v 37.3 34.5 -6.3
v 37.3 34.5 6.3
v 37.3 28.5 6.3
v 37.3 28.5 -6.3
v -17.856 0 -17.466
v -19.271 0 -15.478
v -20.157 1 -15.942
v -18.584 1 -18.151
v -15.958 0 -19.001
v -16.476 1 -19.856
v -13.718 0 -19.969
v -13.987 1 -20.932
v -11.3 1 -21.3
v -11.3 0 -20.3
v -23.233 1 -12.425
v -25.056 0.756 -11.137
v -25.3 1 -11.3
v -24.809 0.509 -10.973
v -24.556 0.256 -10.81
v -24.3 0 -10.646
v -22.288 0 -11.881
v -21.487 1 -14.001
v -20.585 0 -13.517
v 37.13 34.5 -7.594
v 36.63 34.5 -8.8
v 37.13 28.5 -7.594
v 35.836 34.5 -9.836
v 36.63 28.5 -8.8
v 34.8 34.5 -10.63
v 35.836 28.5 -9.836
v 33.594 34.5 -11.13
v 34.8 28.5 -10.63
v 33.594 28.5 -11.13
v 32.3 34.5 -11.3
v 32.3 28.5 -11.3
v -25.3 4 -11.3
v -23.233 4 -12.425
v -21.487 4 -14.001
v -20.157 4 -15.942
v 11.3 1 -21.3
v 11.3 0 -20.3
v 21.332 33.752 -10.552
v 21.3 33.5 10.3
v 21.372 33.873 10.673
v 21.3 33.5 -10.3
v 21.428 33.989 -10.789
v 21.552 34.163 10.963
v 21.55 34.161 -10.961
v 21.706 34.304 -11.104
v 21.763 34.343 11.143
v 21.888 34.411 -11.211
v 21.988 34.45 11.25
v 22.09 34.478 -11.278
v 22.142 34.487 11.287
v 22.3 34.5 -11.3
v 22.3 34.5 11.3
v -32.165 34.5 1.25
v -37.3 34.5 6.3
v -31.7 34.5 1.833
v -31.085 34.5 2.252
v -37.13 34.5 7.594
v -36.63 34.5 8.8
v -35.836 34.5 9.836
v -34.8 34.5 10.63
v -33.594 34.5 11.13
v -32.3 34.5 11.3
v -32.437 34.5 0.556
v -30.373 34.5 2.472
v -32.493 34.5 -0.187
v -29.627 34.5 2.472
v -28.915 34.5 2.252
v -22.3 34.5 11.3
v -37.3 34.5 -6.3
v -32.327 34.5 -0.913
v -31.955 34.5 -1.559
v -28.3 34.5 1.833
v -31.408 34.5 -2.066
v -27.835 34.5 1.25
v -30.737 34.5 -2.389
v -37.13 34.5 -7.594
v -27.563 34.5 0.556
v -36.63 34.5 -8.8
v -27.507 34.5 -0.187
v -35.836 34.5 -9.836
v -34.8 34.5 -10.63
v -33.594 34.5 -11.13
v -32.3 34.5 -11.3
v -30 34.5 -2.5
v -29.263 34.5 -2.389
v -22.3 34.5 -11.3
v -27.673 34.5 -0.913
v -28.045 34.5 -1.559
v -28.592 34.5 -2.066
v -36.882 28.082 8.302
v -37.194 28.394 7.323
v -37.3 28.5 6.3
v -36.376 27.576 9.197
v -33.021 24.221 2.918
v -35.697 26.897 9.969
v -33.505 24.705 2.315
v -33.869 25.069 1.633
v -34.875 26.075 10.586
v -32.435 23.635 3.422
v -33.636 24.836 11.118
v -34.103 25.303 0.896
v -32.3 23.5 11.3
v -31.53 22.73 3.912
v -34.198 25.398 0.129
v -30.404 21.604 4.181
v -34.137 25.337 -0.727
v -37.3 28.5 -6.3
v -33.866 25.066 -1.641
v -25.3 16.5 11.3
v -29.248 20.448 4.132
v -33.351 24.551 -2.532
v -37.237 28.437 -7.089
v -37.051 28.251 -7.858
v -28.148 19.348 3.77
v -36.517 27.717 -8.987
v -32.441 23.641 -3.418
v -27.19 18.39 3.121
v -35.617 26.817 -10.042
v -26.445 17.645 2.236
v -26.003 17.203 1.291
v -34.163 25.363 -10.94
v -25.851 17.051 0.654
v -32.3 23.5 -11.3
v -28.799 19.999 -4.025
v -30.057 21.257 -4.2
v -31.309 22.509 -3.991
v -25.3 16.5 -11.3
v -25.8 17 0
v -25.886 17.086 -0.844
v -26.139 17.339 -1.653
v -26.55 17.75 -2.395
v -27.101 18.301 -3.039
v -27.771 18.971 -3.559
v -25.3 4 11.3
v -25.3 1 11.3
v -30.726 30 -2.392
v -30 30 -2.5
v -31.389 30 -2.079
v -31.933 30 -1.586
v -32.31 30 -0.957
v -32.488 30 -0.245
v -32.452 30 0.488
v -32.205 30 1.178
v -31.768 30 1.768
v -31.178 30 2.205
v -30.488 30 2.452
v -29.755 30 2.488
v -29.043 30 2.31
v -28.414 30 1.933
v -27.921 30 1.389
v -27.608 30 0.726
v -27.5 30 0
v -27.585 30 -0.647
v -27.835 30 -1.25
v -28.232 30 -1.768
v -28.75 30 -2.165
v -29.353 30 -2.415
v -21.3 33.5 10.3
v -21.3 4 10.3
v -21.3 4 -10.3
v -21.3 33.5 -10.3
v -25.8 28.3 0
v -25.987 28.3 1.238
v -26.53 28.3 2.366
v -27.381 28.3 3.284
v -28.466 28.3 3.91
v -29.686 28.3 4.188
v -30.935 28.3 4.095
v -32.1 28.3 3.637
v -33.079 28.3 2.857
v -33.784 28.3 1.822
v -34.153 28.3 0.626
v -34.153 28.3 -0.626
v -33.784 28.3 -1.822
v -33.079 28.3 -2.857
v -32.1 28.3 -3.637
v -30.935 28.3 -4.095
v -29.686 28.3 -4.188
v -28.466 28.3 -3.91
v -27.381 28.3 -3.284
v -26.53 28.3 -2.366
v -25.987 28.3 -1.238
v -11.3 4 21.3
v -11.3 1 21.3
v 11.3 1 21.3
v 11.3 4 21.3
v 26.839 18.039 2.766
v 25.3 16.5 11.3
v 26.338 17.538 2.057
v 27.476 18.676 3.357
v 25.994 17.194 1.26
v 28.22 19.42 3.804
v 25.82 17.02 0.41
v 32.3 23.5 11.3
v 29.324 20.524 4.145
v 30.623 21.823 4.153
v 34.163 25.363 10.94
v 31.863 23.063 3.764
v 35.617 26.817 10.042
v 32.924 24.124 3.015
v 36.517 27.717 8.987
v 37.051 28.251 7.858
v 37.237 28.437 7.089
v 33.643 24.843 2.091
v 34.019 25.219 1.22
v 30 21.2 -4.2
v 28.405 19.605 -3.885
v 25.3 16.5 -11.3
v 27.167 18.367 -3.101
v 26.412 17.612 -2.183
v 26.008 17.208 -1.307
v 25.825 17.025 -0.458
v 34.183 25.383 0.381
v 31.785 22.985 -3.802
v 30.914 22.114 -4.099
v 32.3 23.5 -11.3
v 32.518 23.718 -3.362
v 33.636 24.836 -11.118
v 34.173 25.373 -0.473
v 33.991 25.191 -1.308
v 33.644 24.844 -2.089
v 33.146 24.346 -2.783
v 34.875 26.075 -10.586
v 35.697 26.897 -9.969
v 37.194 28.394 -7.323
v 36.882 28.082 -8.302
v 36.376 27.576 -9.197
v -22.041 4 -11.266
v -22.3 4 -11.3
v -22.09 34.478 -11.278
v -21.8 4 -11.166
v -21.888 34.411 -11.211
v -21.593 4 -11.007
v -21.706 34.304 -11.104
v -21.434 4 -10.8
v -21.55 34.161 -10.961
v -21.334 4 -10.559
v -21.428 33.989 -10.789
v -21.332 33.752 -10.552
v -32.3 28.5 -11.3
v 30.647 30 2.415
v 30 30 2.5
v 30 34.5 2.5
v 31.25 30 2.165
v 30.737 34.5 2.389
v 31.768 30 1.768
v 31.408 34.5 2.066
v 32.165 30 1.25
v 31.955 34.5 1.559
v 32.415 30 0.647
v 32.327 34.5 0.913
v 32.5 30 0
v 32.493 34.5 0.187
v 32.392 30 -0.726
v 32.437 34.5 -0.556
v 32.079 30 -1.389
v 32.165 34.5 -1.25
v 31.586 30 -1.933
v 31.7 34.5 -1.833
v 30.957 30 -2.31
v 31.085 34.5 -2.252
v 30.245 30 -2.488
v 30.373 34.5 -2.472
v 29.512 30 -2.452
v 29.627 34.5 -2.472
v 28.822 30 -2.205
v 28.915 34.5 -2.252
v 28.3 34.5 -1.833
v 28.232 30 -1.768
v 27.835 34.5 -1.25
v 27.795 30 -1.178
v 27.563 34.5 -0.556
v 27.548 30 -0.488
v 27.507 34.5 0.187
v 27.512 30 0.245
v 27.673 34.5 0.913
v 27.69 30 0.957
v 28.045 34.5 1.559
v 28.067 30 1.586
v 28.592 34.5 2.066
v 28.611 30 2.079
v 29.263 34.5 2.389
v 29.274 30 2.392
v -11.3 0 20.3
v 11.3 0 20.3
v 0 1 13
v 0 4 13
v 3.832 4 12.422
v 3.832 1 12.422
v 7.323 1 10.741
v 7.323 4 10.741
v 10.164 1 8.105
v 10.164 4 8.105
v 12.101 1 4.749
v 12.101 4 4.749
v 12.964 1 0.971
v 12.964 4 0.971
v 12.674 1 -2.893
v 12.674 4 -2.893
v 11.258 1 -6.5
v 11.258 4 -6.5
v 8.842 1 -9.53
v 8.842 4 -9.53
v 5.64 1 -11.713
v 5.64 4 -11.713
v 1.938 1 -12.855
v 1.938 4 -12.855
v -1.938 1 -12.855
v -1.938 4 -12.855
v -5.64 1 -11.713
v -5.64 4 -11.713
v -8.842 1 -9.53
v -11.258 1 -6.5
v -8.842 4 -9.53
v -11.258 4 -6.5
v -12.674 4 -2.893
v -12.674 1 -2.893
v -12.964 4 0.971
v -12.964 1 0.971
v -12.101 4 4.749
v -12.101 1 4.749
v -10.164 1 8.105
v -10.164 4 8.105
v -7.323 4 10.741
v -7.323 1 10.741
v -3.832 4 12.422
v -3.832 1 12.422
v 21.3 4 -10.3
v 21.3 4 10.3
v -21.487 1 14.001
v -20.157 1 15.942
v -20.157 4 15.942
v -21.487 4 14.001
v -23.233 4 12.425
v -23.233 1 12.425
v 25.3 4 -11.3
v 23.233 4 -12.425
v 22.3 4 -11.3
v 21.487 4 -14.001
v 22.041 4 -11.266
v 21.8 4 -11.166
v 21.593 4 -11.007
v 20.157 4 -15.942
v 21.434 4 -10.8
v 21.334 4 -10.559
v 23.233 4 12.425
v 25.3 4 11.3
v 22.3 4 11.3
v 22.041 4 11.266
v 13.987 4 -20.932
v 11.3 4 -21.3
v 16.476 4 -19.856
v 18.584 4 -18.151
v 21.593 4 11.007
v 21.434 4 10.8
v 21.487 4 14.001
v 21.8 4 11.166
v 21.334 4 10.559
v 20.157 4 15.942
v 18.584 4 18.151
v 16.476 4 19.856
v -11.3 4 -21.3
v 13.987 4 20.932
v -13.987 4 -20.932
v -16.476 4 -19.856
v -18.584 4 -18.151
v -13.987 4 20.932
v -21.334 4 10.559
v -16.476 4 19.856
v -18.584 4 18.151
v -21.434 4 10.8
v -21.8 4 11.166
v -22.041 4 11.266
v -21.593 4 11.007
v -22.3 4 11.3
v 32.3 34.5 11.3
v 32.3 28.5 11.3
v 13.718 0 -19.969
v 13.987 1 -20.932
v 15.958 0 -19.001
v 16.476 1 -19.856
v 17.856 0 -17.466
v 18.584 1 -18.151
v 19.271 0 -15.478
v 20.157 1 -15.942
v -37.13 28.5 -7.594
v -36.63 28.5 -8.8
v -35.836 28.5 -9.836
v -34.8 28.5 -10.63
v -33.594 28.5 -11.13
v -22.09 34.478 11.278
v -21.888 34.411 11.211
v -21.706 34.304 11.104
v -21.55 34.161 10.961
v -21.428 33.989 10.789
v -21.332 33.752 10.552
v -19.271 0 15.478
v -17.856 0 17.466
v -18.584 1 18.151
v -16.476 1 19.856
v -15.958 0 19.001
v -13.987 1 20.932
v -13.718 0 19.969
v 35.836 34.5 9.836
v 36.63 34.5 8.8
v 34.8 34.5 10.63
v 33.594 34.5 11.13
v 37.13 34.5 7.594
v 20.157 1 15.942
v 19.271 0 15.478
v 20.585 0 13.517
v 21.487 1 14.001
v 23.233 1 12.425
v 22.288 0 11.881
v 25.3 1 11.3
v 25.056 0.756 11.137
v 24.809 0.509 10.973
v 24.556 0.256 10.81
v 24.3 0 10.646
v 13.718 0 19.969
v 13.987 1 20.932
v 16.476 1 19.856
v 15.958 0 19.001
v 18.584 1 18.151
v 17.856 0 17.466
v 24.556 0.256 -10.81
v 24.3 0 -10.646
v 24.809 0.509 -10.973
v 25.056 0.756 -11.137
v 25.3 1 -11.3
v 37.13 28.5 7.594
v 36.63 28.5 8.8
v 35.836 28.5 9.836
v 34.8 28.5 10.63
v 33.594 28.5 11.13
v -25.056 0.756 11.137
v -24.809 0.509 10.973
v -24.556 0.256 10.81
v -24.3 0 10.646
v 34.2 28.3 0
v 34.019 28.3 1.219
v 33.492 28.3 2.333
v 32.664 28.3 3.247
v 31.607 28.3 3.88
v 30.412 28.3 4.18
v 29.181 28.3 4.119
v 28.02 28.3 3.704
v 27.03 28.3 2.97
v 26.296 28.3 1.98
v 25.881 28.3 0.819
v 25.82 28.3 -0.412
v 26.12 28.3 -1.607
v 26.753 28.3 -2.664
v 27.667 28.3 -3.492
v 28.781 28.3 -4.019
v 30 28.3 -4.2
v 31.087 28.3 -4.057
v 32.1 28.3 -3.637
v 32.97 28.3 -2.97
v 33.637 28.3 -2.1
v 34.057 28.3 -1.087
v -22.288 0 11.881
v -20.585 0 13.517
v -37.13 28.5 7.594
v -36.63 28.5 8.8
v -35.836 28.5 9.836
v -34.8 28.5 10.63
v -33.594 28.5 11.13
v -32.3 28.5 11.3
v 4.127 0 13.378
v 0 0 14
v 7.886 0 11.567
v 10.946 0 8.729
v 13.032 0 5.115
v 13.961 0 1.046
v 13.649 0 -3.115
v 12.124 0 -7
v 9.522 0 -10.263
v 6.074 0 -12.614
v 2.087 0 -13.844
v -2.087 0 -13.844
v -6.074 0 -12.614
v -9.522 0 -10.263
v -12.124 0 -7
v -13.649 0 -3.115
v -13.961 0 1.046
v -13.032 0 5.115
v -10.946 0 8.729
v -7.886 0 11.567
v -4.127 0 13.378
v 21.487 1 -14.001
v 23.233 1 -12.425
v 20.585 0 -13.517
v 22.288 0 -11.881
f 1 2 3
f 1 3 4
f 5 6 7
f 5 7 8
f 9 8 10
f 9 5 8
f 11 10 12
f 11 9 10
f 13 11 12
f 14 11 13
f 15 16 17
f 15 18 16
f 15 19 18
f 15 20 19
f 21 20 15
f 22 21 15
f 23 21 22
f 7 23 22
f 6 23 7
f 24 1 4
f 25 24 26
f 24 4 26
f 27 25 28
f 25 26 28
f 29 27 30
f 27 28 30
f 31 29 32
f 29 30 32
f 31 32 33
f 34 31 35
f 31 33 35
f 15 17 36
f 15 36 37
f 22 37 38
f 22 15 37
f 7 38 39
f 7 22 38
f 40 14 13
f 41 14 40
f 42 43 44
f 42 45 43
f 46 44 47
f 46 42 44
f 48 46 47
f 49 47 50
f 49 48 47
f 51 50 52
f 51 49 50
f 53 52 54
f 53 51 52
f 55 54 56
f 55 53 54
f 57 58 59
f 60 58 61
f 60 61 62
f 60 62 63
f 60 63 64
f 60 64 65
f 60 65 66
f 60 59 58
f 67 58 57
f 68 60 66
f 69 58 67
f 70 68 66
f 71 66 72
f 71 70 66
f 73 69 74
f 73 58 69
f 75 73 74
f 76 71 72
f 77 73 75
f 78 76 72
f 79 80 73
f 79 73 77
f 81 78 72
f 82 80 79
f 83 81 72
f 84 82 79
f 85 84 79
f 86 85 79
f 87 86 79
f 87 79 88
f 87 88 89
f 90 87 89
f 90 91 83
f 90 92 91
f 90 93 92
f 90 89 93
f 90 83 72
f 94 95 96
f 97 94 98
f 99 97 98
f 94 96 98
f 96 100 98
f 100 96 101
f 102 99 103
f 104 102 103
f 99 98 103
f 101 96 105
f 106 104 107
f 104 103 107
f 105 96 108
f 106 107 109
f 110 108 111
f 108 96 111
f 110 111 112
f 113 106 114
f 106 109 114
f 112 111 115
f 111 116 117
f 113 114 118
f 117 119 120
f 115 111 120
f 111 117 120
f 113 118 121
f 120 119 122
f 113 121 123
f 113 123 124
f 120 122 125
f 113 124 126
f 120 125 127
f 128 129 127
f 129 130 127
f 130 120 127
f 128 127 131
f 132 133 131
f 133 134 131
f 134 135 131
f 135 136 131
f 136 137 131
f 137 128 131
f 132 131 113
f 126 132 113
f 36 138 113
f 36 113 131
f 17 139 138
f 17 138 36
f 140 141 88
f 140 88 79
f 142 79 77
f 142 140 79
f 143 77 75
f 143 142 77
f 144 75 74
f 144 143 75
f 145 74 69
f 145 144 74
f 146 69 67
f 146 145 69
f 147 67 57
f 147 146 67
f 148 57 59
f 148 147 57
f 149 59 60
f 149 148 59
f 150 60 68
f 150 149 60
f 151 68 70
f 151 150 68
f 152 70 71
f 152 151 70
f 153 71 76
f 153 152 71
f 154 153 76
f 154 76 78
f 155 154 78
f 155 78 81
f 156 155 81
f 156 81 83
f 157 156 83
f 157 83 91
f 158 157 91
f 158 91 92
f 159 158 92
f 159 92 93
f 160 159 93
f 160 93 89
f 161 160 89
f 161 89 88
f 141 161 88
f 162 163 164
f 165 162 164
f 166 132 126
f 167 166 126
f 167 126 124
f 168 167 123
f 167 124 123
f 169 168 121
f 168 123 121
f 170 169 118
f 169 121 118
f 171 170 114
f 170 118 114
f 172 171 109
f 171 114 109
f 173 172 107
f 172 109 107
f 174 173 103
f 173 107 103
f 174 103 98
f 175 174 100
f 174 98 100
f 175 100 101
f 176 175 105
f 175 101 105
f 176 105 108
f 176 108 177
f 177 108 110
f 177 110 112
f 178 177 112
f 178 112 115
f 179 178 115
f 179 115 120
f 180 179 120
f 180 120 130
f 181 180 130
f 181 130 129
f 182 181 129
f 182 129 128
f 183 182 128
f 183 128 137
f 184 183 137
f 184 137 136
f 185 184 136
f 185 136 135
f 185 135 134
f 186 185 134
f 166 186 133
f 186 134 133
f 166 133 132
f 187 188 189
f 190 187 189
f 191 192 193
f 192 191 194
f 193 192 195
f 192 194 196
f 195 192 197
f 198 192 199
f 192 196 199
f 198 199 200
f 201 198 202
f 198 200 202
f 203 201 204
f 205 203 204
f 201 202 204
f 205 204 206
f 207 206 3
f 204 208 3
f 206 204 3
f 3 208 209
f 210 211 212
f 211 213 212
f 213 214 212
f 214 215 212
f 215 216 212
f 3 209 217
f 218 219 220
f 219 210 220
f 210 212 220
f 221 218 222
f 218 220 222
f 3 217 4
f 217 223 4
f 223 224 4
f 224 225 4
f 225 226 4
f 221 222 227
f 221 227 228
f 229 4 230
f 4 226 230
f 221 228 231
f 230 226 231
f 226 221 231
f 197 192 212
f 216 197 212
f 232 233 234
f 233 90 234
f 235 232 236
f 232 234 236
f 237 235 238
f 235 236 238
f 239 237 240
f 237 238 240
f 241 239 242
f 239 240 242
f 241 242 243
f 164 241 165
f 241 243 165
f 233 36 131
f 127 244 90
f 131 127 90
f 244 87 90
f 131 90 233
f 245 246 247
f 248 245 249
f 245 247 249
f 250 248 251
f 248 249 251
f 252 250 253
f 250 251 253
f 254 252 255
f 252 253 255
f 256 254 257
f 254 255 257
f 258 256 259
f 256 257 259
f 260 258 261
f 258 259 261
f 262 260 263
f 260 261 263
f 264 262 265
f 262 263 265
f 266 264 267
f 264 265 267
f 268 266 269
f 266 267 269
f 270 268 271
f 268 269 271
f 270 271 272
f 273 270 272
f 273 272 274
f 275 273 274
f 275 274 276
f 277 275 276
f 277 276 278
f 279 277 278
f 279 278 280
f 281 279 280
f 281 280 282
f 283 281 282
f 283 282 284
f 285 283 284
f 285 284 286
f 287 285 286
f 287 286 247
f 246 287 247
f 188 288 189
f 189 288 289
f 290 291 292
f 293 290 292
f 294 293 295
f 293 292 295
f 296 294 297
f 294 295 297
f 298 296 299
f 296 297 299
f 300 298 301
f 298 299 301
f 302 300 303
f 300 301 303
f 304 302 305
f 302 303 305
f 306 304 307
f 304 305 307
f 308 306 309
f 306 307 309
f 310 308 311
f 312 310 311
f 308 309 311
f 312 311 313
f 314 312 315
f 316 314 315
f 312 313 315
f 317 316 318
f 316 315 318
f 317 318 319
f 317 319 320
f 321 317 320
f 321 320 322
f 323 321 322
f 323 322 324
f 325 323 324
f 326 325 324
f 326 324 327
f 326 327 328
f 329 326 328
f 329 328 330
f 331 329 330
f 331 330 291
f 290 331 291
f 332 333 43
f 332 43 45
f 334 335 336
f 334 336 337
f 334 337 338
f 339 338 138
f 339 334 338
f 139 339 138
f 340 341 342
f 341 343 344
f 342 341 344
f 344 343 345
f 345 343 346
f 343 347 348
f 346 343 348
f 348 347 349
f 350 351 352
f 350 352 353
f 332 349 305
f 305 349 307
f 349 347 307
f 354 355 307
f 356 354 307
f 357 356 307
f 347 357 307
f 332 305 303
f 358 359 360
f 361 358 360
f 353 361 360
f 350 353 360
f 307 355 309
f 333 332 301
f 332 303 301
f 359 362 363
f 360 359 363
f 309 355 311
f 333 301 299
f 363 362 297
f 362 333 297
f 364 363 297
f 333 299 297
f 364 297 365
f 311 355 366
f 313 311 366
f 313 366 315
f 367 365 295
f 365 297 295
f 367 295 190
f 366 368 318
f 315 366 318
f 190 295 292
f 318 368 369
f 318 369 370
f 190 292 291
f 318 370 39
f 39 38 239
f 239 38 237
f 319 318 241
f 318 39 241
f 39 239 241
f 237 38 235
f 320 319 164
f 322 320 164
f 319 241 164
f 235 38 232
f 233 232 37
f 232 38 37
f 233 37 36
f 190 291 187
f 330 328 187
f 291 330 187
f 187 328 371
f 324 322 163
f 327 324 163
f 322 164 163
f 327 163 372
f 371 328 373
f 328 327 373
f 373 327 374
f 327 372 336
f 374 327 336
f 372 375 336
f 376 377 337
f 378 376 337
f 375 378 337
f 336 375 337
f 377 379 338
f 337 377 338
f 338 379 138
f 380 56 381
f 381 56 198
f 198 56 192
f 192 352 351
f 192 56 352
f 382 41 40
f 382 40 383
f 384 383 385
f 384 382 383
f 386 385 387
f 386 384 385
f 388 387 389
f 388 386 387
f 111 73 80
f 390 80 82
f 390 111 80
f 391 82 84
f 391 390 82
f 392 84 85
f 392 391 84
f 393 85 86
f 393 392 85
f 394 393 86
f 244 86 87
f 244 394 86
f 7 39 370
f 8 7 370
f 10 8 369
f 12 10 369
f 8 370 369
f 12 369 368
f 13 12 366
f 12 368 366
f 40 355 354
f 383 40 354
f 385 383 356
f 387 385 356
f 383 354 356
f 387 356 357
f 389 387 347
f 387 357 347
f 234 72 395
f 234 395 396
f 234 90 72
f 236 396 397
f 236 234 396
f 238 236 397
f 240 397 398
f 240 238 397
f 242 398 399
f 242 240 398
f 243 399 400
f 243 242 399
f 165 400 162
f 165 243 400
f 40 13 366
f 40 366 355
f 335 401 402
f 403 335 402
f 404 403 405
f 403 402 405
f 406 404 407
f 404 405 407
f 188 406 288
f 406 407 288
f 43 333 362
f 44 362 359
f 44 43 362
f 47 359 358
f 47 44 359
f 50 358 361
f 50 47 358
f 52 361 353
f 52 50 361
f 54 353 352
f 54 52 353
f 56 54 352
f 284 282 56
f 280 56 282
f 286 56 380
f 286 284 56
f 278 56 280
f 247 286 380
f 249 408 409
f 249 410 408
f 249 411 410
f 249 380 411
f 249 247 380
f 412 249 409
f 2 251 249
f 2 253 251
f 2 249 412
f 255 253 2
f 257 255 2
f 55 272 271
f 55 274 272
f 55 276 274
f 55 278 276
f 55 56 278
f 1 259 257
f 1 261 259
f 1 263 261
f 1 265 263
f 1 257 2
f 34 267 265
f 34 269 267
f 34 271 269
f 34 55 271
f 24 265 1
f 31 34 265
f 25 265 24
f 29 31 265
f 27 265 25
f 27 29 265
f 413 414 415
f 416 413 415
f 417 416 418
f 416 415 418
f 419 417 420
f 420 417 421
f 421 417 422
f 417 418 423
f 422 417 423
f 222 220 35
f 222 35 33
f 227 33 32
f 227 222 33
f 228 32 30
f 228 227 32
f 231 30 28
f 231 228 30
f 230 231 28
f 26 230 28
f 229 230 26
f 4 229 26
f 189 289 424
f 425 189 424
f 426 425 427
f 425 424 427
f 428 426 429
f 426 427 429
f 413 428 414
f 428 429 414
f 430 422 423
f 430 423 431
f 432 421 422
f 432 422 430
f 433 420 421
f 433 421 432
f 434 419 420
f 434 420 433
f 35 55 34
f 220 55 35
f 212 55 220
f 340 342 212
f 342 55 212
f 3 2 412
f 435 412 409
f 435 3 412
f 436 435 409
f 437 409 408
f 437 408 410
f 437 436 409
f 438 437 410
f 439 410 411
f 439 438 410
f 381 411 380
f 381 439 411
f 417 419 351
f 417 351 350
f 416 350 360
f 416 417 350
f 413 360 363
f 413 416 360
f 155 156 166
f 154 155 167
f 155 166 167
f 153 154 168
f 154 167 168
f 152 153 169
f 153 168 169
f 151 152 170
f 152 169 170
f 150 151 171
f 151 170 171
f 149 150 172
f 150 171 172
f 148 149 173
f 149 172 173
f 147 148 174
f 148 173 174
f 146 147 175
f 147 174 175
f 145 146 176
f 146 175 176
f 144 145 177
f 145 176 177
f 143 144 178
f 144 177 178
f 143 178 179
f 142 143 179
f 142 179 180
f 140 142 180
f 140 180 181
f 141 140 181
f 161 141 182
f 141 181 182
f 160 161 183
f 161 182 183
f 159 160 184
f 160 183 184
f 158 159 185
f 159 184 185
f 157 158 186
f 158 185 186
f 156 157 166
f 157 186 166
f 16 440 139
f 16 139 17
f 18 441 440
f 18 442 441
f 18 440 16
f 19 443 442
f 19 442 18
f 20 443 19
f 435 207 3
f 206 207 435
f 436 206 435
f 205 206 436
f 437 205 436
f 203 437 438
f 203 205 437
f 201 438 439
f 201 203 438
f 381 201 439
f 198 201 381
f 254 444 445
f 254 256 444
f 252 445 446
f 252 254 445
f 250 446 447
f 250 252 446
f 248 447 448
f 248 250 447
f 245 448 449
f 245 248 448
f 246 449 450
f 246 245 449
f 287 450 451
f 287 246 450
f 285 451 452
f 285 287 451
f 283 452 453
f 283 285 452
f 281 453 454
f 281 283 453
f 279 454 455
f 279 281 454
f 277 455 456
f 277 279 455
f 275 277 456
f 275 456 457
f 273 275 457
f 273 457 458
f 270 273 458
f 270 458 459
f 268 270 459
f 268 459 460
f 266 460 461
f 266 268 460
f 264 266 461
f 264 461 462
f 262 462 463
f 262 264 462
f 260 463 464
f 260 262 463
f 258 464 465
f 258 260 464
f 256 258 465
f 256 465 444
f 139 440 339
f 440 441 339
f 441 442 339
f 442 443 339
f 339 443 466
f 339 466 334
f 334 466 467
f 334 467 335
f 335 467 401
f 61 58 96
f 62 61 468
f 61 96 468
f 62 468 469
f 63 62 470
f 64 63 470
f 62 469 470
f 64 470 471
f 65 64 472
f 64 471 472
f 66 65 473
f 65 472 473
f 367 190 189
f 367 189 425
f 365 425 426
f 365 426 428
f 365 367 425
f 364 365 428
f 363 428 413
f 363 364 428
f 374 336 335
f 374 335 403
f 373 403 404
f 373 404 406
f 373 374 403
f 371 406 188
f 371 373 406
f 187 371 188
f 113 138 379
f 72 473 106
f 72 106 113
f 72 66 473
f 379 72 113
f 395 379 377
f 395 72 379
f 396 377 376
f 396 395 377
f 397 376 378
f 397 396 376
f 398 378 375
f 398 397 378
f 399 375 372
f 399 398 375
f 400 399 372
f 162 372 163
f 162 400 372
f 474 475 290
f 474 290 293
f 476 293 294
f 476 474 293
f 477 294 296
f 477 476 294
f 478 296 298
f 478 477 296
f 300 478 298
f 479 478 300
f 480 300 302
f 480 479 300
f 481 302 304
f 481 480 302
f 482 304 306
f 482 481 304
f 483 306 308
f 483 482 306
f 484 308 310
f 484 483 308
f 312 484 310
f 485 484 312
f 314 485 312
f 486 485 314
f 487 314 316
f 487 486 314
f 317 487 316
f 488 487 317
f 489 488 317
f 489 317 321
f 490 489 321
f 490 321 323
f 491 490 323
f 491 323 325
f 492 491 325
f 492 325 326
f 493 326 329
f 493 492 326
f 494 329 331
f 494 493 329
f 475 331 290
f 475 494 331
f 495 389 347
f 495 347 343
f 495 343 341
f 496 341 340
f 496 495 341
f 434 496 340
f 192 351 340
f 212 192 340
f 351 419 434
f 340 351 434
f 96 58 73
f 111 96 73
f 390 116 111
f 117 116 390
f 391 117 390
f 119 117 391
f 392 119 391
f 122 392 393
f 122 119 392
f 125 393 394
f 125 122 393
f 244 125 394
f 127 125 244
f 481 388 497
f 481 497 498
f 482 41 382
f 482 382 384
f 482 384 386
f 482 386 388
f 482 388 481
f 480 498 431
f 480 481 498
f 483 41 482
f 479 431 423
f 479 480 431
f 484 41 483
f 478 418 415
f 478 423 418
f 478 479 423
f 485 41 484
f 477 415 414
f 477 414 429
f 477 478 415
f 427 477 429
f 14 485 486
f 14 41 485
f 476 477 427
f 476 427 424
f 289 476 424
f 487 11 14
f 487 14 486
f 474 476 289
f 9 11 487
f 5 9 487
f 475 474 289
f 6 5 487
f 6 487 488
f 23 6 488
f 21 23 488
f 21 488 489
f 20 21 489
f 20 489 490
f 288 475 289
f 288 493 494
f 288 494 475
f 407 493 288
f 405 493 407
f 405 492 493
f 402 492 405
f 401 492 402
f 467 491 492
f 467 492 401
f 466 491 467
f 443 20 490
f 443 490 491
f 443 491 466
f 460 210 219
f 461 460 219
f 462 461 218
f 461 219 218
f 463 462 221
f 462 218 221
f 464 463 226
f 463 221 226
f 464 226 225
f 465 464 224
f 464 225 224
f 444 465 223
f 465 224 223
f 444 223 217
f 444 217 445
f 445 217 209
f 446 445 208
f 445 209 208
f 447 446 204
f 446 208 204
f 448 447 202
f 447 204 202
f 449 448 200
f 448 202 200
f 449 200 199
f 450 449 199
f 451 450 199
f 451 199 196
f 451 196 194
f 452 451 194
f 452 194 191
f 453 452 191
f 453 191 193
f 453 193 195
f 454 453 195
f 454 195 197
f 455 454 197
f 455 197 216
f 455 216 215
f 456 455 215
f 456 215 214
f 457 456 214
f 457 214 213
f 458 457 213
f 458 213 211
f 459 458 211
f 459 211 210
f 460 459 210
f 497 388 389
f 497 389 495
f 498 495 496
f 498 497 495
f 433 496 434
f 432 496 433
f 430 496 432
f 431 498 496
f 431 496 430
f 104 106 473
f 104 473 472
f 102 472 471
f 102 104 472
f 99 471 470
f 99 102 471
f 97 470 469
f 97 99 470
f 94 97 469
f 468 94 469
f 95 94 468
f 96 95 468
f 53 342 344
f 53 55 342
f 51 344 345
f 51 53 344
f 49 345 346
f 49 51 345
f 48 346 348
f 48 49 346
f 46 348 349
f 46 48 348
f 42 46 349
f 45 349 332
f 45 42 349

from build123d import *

# Parameters (mm, degrees)
SKETCH_1_W            = 42.6
SKETCH_1_H            = 42.6
EXTRUDE_1_DEPTH       = 4
SKETCH_2_R            = 13
CUT_EXTRUDE_1_DEPTH   = 6
FILLET_1_R            = 10
SKETCH_3_W            = 4
SKETCH_3_H            = 22.6
EXTRUDE_2_DEPTH       = 34.5
FILLET_2_R            = 10
SKETCH_4_W            = 12
SKETCH_4_H            = 22.6
EXTRUDE_3_DEPTH       = 6
FILLET_3_R            = 5
FILLET_4_R            = 1
CHAMFER_3_SIZE        = 1
SKETCH_5_R            = 2.5
CUT_EXTRUDE_2_DEPTH   = 56.092921505
CHAMFER_START         = -9.101924
CHAMFER_4_DEPTH       = 6.602294476
CHAMFER_START_2       = 2.5000001
CHAMFER_4_2_DEPTH     = 6.6019239
CHAMFER_START_3       = -2.499629524
CHAMFER_4_3_DEPTH     = 4.999629624
CHAMFER_START_4       = -11.3
CHAMFER_4_4_DEPTH     = 2.198076
CHAMFER_START_5       = 9.101924
CHAMFER_4_5_DEPTH     = 2.198076
CHAMFER_START_6       = 16.5
CHAMFER_4_6_OUTLINE_R = 2.5
CHAMFER_4_6_DEPTH     = 12
SKETCH_6_R            = 4.2
CUT_EXTRUDE_5_DEPTH   = 28


with BuildPart() as part:
    # Эскиз1 → Бобышка-Вытянуть1 (new body)
    with BuildSketch(Plane(origin=(0, 0, 0), x_dir=(1, 0, 0), z_dir=(0, 1, 0))):
        Rectangle(SKETCH_1_W, SKETCH_1_H)
    extrude(amount=EXTRUDE_1_DEPTH)

    # Эскиз2 → Вырез-Вытянуть1 (cut)
    with BuildSketch(Plane(origin=(0, 4, 0), x_dir=(1, 0, 0), z_dir=(0, 1, 0))):
        with Locations(Location((0, 0, 0), (0, 0, 270))):
            Circle(SKETCH_2_R)
    extrude(amount=-CUT_EXTRUDE_1_DEPTH, mode=Mode.SUBTRACT)

    # Скругление1
    fillet_1_edges = [part.edges().sort_by_distance(p)[0] for p in [
        (21.3, 2, 21.3),
        (-21.3, 2, 21.3),
        (-21.3, 2, -21.3),
        (21.3, 2, -21.3),
    ]]
    fillet(fillet_1_edges, radius=FILLET_1_R)

    # Эскиз3 → Бобышка-Вытянуть2 (add)
    with BuildSketch(Plane(origin=(0, 0, 0), x_dir=(1, 0, 0), z_dir=(0, 1, 0))):
        with Locations((-23.3, 0)):
            Rectangle(SKETCH_3_W, SKETCH_3_H)
        with Locations((23.3, 0)):
            Rectangle(SKETCH_3_W, SKETCH_3_H)
    extrude(amount=EXTRUDE_2_DEPTH)

    # Скругление2
    # the kernel refuses this fillet: 10 mm, written as the material it adds along each edge
    with BuildSketch(Plane(origin=(21.3, 0, -11.3), x_dir=(-0.23904572186687842, 0, -0.9710083124552246), z_dir=(0, 1, 0)), Plane(origin=(-21.3, 0, 11.3), x_dir=(0.2390457218668792, 0, 0.9710083124552243), z_dir=(0, 1, 0))) as fillet_2_piece_1:
        with BuildLine():
            CenterArc((7.171371656, -9.710083125), FILLET_2_R, 103.83022495, 40.535802111)
            Line((-0.956182887, -3.88403325), (0, 0))
            ThreePointArc((0, 0), (2.390457219, -0.289916875), (4.780914437, 0))
        make_face()
    extrude(amount=4)
    with BuildSketch(Plane(origin=(-21.3, 0, -11.3), x_dir=(0.23904572186687842, 0, -0.9710083124552246), z_dir=(0, 1, 0)), Plane(origin=(21.3, 0, 11.3), x_dir=(-0.2390457218668792, 0, 0.9710083124552243), z_dir=(0, 1, 0))) as fillet_2_piece_2:
        with BuildLine():
            CenterArc((7.171371656, 9.710083125), FILLET_2_R, 215.633972939, 40.535802111)
            Line((-0.956182887, 3.88403325), (0, 0))
            ThreePointArc((0, 0), (2.390457219, 0.289916875), (4.780914437, 0))
        make_face()
    extrude(amount=4)

    # Эскиз4 → Бобышка-Вытянуть3 (add)
    with BuildSketch(Plane(origin=(0, 34.5, 0), x_dir=(1, 0, 0), z_dir=(0, 1, 0))):
        with Locations((-31.3, 0)):
            Rectangle(SKETCH_4_W, SKETCH_4_H)
        with Locations((31.3, 0)):
            Rectangle(SKETCH_4_W, SKETCH_4_H)
    extrude(amount=-EXTRUDE_3_DEPTH)

    # Скругление3
    fillet_3_edges = [part.edges().sort_by_distance(p)[0] for p in [
        (37.3, 31.5, -11.3),
        (37.3, 31.5, 11.3),
        (-37.3, 31.5, 11.3),
        (-37.3, 31.5, -11.3),
    ]]
    fillet(fillet_3_edges, radius=FILLET_3_R)

    # Скругление4
    fillet_4_edges = [part.edges().sort_by_distance(p)[0] for p in [
        (21.3, 19.25, -11.3),
        (21.3, 19.25, 11.3),
        (21.3, 34.5, 0),
        (-21.3, 19.25, 11.3),
        (-21.3, 19.25, -11.3),
        (-21.3, 34.5, 0),
    ]]
    fillet(fillet_4_edges, radius=FILLET_4_R)

    # Фаска3
    chamfer_3_edges = [part.edges().sort_by_distance(p)[0] for p in [
        (0, 0, -13),
        (0, 0, 21.3),
        (0, 0, -21.3),
        (16.475757114, 0, -19.856374133),
        (-16.475757114, 0, 19.856374133),
        (25.3, 0, 0),
        (-25.3, 0, 0),
        (-16.475757114, 0, -19.856374133),
        (16.475757114, 0, 19.856374133),
        (22.313691772, 0, -13.16154043),
        (-22.313691772, 0, -13.16154043),
        (-22.313691772, 0, 13.16154043),
        (22.313691772, 0, 13.16154043),
    ]]
    chamfer(chamfer_3_edges, length=CHAMFER_3_SIZE)

    # Эскиз5 → Вырез-Вытянуть2 (cut, through all)
    with BuildSketch(Plane(origin=(0, 34.5, 0), x_dir=(1, 0, 0), z_dir=(0, 1, 0))):
        with Locations(Location((30, 0, 0), (0, 0, 270))):
            Circle(SKETCH_5_R)
        with Locations(Location((-30, 0, 0), (0, 0, 90))):
            Circle(SKETCH_5_R)
    extrude(amount=-CUT_EXTRUDE_2_DEPTH, mode=Mode.SUBTRACT)

    # Фаска4: read off the stored shape, not the designer's step
    # Фаска4 outline → Фаска4 (add)
    with BuildSketch(Plane.XY.offset(CHAMFER_START)):
        Polygon((-37.3, 28.5), (-25.3, 16.5), (-25.3, 28.5), align=None)
        Polygon((25.3, 28.5), (25.3, 16.5), (37.3, 28.5), align=None)
    extrude(amount=CHAMFER_4_DEPTH)

    # Chamfer 4 2 outline → Chamfer 4 2 (add)
    with BuildSketch(Plane.XY.offset(CHAMFER_START_2)):
        Polygon((-37.3, 28.5), (-25.3, 16.5), (-25.3, 28.5), align=None)
        Polygon((25.3, 28.5), (25.3, 16.5), (37.3, 28.5), align=None)
    extrude(amount=CHAMFER_4_2_DEPTH)

    # Chamfer 4 3 outline → Chamfer 4 3 (add)
    with BuildSketch(Plane.XY.offset(CHAMFER_START_3)):
        Polygon((-37.3, 28.5), (-25.3, 16.5), (-25.3, 28.5), align=None)
        Polygon((25.3, 28.5), (25.3, 16.5), (37.3, 28.5), align=None)
    extrude(amount=CHAMFER_4_3_DEPTH)

    # Chamfer 4 4 outline → Chamfer 4 4 (add)
    with BuildSketch(Plane.XY.offset(CHAMFER_START_4)):
        Polygon((-37.3, 28.5), (-25.3, 16.5), (-25.3, 28.5), align=None)
        Polygon((25.3, 28.5), (25.3, 16.5), (37.3, 28.5), align=None)
    extrude(amount=CHAMFER_4_4_DEPTH)

    # Chamfer 4 5 outline → Chamfer 4 5 (add)
    with BuildSketch(Plane.XY.offset(CHAMFER_START_5)):
        Polygon((-37.3, 28.5), (-25.3, 16.5), (-25.3, 28.5), align=None)
        Polygon((25.3, 28.5), (25.3, 16.5), (37.3, 28.5), align=None)
    extrude(amount=CHAMFER_4_5_DEPTH)

    # Chamfer 4 6 outline → Chamfer 4 6 (cut)
    with BuildSketch(Plane(origin=(0, 0, 0), x_dir=(1, 0, 0), z_dir=(0, 1, 0)).offset(CHAMFER_START_6)):
        with BuildLine():
            Line((37.299999999, -11.3), (37.3, -6.3))
            ThreePointArc((37.3, -6.3), (35.835533906, -9.835533906), (32.3, -11.3))
            Line((32.3, -11.3), (37.299999999, -11.3))
        make_face()
        with BuildLine():
            ThreePointArc((32.3, 11.3), (35.835533906, 9.835533906), (37.3, 6.3))
            Line((37.3, 6.3), (37.299999999, 11.3))
            Line((37.299999999, 11.3), (32.3, 11.3))
        make_face()
        with BuildLine():
            Line((-37.3, -11.3), (-32.3, -11.3))
            ThreePointArc((-32.3, -11.3), (-35.835533906, -9.835533906), (-37.3, -6.3))
            Line((-37.3, -6.3), (-37.3, -11.3))
        make_face()
        with BuildLine():
            ThreePointArc((-37.3, 6.3), (-35.835533906, 9.835533906), (-32.3, 11.3))
            Line((-32.3, 11.3), (-37.3, 11.3))
            Line((-37.3, 11.3), (-37.3, 6.3))
        make_face()
        with Locations((-30, 0)):
            Circle(CHAMFER_4_6_OUTLINE_R)
        with Locations((30, 0)):
            Circle(CHAMFER_4_6_OUTLINE_R)
    extrude(amount=CHAMFER_4_6_DEPTH, mode=Mode.SUBTRACT)

    # Эскиз6 → Вырез-Вытянуть5 (cut)
    with BuildSketch(Plane.XZ):
        with Locations(Location((30, 0, 0), (0, 0, 270))):
            Circle(SKETCH_6_R)
        with Locations((-30, 0)):
            Circle(SKETCH_6_R)
    extrude(amount=-CUT_EXTRUDE_5_DEPTH, mode=Mode.SUBTRACT)

    # Фаска5
    # the kernel refuses this chamfer: 2 mm, written as the material it takes off along each edge
    with BuildSketch(Plane(origin=(30, 28, 0), x_dir=(1, 0, 0), z_dir=(0, 0, -1))) as chamfer_5_piece_1_section:
        with BuildLine():
            Line((4.556568542, 0.056568542), (2.443431458, -2.056568542))
            Line((2.443431458, -2.056568542), (2.403431458, -2.056568542))
            ThreePointArc((2.403431458, -2.056568542), (2.46, -1.028284271), (2.46, 0))
            Line((2.46, 0), (2.5, 0.04))
            ThreePointArc((2.5, 0.04), (3.528284271, 0.04), (4.556568542, 0.096568542))
            Line((4.556568542, 0.096568542), (4.556568542, 0.056568542))
        make_face()
    chamfer_5_piece_1 = revolve(axis=Axis((30, 28, 0), (0, -1, 0)), mode=Mode.PRIVATE)
    chamfer_5_piece_1 = chamfer_5_piece_1 & Plane(origin=(30, 28, 0), x_dir=(0, 0, -1), z_dir=(0, -1, 0)) * Cylinder(4.2, 19, mode=Mode.PRIVATE)
    add(chamfer_5_piece_1, mode=Mode.SUBTRACT)
    with BuildSketch(Plane(origin=(-30, 28, 0), x_dir=(1, 0, 0), z_dir=(0, 0, -1))) as chamfer_5_piece_2_section:
        with BuildLine():
            Line((2.443431458, -2.056568542), (4.556568542, 0.056568542))
            Line((4.556568542, 0.056568542), (4.556568542, 0.096568542))
            ThreePointArc((4.556568542, 0.096568542), (3.528284271, 0.04), (2.5, 0.04))
            Line((2.5, 0.04), (2.46, 0))
            ThreePointArc((2.46, 0), (2.46, -1.028284271), (2.403431458, -2.056568542))
            Line((2.403431458, -2.056568542), (2.443431458, -2.056568542))
        make_face()
    chamfer_5_piece_2 = revolve(axis=Axis((-30, 28, 0), (0, -1, 0)), mode=Mode.PRIVATE)
    chamfer_5_piece_2 = chamfer_5_piece_2 & Plane(origin=(-30, 28, 0), x_dir=(1, 0, 0), z_dir=(0, -1, 0)) * Cylinder(4.2, 19, mode=Mode.PRIVATE)
    add(chamfer_5_piece_2, mode=Mode.SUBTRACT)


solid = part.part
